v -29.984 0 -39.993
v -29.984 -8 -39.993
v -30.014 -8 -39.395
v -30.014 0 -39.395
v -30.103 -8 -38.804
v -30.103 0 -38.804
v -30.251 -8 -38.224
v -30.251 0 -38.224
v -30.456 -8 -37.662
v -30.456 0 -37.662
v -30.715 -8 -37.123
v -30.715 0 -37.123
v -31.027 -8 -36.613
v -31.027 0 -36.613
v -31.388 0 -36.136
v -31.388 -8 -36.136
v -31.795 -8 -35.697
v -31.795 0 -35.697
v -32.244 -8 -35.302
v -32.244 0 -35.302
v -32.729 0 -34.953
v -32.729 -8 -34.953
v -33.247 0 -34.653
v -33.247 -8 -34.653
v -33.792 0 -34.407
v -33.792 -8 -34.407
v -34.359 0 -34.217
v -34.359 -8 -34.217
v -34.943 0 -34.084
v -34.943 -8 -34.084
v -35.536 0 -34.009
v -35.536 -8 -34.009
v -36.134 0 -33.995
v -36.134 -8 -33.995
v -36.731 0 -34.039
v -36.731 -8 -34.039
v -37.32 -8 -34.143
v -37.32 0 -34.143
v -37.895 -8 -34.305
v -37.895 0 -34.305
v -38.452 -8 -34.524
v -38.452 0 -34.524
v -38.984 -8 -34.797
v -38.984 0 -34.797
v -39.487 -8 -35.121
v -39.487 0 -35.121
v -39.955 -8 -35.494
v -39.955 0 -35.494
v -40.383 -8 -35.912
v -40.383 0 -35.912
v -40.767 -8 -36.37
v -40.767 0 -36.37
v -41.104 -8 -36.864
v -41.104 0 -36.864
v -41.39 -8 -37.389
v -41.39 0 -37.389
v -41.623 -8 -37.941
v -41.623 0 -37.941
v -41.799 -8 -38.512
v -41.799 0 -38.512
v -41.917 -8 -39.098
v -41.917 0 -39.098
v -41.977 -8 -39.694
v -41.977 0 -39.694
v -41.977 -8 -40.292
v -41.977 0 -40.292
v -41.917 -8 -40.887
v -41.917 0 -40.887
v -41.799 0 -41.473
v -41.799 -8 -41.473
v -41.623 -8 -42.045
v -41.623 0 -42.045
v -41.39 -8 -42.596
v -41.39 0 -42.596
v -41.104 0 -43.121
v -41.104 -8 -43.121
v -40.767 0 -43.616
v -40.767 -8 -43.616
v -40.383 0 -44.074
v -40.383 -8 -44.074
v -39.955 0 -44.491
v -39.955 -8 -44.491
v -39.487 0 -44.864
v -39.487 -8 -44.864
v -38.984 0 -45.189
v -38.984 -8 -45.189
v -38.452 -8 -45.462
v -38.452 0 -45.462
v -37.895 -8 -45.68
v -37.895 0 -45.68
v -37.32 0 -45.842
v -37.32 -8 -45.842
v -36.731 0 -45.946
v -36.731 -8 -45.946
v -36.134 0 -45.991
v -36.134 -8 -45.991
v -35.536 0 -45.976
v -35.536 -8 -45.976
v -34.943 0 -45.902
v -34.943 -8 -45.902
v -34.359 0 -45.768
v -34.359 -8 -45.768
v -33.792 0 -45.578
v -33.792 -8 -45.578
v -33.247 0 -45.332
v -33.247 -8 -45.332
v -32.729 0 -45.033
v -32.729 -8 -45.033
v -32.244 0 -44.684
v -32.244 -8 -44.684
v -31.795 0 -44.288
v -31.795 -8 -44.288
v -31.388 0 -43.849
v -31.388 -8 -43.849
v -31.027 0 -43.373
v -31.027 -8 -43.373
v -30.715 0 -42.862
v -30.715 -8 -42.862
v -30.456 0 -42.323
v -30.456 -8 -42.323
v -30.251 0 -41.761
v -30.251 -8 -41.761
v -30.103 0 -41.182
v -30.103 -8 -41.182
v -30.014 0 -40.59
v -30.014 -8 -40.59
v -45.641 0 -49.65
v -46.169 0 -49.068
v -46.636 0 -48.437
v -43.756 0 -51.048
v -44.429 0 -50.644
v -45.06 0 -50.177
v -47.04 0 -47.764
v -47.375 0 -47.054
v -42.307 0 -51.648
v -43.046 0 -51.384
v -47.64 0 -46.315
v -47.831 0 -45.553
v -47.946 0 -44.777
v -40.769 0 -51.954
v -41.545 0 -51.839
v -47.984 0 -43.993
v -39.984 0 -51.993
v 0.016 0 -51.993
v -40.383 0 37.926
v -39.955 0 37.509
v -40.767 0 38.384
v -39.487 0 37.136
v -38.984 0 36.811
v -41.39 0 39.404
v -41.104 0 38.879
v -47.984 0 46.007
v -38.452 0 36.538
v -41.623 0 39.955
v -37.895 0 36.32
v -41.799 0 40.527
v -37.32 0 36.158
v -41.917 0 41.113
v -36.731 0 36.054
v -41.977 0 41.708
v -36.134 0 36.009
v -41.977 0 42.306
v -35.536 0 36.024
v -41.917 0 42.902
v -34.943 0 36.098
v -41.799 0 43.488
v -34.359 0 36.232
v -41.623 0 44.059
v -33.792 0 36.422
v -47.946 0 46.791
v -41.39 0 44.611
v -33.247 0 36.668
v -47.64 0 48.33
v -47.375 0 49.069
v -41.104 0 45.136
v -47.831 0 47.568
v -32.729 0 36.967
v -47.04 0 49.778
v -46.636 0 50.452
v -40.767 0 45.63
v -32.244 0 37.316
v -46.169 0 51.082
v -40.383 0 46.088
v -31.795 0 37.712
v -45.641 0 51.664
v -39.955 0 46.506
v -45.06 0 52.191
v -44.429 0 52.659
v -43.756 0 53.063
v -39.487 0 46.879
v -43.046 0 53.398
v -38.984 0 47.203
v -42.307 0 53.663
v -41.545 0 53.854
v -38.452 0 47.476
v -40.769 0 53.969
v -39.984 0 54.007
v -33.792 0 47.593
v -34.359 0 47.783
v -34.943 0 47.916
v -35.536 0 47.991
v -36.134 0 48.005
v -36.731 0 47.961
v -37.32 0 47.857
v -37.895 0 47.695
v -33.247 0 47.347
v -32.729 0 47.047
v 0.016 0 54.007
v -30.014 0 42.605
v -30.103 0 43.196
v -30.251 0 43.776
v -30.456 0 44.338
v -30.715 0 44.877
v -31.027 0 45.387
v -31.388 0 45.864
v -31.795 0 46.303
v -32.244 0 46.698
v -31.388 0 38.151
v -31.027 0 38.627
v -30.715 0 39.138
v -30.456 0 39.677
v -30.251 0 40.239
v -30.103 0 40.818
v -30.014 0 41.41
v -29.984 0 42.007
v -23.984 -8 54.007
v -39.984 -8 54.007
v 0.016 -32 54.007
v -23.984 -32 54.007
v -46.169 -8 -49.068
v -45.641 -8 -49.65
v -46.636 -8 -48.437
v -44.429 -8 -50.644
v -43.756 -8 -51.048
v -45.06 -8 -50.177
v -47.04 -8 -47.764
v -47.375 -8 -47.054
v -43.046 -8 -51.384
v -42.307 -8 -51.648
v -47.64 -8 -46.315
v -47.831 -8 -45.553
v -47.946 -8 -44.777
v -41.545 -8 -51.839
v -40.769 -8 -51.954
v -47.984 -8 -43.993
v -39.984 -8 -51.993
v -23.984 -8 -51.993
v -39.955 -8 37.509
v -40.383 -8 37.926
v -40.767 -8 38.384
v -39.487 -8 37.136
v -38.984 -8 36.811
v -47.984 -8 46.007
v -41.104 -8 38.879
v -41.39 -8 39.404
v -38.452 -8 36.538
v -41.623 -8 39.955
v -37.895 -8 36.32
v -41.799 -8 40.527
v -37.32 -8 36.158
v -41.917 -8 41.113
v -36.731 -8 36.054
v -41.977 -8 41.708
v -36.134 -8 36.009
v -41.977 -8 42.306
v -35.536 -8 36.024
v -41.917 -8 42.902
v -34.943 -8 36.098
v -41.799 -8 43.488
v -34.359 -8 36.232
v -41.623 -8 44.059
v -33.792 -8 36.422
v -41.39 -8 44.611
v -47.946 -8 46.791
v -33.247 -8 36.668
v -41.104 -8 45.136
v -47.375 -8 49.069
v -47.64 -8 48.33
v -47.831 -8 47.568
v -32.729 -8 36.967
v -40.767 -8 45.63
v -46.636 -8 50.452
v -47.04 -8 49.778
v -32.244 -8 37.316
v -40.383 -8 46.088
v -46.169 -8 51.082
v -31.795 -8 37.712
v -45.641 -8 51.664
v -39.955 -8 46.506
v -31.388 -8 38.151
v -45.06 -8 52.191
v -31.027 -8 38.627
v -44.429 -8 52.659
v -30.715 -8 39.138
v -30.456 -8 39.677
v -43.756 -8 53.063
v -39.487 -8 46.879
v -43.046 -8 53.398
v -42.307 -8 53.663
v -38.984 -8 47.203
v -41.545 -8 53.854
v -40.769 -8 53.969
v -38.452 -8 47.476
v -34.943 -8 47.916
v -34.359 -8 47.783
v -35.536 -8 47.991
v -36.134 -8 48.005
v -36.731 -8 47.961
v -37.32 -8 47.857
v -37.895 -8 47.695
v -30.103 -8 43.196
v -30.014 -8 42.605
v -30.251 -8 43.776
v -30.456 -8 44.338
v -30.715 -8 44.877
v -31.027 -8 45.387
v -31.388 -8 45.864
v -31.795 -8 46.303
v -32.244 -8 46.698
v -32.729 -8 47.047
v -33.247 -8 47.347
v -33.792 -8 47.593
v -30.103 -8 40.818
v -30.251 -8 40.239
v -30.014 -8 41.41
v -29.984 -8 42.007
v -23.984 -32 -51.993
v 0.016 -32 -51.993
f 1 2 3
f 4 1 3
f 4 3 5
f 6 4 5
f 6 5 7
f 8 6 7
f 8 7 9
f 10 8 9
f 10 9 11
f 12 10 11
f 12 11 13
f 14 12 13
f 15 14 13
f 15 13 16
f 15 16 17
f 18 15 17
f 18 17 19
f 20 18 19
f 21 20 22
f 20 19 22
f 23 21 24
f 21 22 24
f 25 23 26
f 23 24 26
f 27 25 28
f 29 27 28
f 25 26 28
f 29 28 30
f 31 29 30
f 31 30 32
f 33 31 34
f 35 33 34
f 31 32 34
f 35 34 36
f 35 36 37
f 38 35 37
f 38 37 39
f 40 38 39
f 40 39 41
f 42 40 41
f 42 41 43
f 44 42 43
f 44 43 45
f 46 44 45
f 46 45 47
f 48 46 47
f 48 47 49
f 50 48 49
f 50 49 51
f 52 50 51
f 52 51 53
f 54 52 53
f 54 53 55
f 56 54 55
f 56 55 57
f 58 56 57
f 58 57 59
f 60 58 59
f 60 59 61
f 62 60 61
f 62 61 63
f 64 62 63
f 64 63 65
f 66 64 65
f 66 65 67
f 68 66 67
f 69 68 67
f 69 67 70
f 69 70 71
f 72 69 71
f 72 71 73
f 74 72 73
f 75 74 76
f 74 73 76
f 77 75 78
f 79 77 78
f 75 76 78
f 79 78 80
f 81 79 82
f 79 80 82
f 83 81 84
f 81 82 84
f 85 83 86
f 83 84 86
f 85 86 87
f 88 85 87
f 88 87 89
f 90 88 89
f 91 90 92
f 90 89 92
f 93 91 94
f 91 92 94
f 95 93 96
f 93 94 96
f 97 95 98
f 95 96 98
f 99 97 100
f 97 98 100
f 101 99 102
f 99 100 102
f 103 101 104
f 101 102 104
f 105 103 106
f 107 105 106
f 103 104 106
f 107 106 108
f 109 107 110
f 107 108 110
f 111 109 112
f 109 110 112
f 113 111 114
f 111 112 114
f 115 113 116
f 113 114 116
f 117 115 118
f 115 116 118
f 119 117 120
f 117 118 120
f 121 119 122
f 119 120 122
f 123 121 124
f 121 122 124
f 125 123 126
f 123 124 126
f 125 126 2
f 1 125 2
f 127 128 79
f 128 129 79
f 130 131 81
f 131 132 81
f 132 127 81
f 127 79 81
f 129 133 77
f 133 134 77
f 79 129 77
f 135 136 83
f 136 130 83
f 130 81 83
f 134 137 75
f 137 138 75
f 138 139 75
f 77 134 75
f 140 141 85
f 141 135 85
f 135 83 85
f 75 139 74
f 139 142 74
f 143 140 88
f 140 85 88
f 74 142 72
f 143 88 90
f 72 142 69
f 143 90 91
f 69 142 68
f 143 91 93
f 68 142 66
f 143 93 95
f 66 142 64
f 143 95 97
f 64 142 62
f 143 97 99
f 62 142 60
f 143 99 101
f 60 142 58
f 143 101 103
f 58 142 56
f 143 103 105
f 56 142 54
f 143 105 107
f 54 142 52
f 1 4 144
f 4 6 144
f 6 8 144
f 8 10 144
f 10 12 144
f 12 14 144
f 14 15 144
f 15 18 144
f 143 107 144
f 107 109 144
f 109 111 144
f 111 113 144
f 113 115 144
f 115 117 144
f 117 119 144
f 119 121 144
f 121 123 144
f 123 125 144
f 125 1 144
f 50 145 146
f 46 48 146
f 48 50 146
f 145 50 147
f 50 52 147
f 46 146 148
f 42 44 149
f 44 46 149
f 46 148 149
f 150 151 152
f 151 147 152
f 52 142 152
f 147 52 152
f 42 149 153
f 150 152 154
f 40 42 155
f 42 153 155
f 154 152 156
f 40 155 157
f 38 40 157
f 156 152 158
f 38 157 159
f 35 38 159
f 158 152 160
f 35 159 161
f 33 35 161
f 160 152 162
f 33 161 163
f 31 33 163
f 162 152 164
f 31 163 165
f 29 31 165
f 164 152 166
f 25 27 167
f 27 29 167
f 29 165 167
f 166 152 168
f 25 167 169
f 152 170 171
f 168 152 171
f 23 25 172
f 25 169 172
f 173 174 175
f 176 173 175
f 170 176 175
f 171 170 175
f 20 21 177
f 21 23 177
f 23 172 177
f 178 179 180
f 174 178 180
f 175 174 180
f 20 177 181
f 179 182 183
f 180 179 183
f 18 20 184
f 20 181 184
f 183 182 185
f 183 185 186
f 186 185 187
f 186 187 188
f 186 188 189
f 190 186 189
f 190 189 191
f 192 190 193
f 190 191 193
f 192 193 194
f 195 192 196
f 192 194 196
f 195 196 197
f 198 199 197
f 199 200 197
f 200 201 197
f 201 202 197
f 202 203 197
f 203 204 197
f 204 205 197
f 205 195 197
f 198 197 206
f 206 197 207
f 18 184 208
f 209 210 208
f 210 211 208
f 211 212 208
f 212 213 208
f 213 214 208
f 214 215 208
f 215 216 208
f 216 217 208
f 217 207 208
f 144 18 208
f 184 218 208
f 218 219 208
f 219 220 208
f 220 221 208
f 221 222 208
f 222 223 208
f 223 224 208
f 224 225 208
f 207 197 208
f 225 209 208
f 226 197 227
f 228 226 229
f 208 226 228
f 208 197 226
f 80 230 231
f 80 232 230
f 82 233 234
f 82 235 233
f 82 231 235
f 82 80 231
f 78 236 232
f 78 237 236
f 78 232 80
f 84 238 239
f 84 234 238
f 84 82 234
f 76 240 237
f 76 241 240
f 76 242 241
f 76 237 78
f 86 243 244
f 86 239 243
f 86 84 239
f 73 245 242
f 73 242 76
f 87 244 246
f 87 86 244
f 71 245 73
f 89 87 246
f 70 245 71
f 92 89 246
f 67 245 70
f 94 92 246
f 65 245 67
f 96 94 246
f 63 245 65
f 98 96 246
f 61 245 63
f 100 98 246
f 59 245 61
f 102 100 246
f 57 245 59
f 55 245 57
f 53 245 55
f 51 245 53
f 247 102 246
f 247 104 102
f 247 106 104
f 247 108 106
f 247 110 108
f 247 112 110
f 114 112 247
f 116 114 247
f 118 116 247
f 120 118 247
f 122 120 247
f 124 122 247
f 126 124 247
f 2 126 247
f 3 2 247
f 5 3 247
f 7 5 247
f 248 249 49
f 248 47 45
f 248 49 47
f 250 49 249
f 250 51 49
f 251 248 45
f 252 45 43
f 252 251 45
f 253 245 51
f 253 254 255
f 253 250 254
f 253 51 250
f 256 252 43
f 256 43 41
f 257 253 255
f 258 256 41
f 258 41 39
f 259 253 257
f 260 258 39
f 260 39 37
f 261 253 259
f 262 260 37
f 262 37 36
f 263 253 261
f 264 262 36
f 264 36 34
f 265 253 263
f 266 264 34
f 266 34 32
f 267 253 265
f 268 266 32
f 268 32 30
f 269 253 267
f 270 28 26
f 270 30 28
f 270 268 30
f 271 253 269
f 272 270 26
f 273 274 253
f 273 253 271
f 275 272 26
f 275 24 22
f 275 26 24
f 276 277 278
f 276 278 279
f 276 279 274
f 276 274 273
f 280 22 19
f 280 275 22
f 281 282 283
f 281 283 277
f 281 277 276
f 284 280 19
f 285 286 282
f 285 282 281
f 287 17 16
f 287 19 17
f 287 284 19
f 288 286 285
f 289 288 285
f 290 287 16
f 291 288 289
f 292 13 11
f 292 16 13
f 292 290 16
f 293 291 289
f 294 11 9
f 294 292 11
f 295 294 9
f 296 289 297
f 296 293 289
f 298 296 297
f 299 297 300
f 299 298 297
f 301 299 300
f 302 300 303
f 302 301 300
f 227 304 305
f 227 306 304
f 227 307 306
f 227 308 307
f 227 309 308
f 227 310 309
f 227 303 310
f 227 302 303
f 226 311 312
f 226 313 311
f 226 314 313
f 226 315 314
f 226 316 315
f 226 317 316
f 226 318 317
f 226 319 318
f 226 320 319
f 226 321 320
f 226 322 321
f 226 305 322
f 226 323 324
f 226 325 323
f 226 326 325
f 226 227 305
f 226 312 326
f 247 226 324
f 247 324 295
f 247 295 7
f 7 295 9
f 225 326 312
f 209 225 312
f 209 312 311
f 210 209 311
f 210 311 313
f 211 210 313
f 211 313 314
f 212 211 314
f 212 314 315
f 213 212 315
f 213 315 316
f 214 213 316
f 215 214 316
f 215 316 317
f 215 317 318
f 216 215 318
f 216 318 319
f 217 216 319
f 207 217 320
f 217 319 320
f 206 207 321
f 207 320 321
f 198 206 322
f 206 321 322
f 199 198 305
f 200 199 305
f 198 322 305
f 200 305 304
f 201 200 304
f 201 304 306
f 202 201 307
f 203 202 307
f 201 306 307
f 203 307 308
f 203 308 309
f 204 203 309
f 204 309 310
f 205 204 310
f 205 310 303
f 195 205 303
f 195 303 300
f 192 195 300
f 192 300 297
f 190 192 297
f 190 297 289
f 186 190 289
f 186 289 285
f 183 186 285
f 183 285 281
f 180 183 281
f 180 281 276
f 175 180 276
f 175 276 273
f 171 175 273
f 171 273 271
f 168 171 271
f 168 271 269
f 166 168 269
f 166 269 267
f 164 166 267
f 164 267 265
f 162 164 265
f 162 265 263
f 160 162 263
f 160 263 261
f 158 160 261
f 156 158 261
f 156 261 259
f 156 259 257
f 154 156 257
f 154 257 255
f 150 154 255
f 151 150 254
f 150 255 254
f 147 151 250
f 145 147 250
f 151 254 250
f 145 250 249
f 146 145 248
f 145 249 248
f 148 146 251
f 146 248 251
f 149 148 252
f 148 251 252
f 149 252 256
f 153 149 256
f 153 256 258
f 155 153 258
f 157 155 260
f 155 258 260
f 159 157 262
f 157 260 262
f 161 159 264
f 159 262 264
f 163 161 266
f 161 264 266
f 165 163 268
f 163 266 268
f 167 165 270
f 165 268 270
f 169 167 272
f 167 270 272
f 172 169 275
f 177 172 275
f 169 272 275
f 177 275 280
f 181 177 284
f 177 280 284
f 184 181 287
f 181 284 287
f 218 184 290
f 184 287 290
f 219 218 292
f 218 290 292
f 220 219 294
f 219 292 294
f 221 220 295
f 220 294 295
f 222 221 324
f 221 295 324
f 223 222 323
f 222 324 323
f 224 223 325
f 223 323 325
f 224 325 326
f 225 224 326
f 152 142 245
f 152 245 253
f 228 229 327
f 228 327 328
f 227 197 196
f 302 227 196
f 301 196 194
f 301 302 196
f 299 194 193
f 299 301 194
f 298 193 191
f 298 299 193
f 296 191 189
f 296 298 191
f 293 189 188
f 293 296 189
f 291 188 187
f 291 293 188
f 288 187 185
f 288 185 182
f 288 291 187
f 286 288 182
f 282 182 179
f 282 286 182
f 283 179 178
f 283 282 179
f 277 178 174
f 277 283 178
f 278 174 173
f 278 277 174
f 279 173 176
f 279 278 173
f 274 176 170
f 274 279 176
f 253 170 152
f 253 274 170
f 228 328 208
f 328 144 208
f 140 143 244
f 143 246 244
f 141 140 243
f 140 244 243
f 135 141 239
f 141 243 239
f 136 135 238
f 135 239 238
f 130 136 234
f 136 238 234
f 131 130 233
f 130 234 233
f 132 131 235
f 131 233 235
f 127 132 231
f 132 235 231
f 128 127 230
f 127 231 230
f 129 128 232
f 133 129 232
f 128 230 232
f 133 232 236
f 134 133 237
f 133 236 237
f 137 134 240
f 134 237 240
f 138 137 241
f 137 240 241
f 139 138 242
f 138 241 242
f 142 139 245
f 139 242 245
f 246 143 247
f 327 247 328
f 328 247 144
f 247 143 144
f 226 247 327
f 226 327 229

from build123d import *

# Parameters (mm, degrees)
F0_W     = 48
F0_H     = 106
F1_DEPTH = 8
F2_W     = 24
F2_H     = 106
F3_DEPTH = 24
F4_R     = 6
F5_DEPTH = 40
F6_R     = 8


with BuildPart() as f1:
    # F0 (on Front) → F1 (new body)
    with BuildSketch(Plane.XZ):
        with Locations((-23.98444, 1.00732)):
            Rectangle(F0_W, F0_H)
    extrude(amount=F1_DEPTH)

    # F2 (on face) → F3 (join)
    with BuildSketch(Plane.XZ.offset(8)):
        with Locations((-11.98444, 1.00732)):
            Rectangle(F2_W, F2_H)
    extrude(amount=F3_DEPTH)

    # F4 (on face) → F5 (cut)
    with BuildSketch(Plane.XZ.offset(8)):
        with Locations((-35.98444, 42.00732)):
            Circle(F4_R)
        with Locations((-35.98444, -39.99268)):
            Circle(F4_R)
    extrude(amount=-F5_DEPTH, mode=Mode.SUBTRACT)

    # F6
    f6_edges = [f1.edges().sort_by_distance(p)[0] for p in [
        (-47.98444, -4, 54.00732),
        (-47.98444, -4, -51.99268),
    ]]
    fillet(f6_edges, radius=F6_R)


solid = f1.part
